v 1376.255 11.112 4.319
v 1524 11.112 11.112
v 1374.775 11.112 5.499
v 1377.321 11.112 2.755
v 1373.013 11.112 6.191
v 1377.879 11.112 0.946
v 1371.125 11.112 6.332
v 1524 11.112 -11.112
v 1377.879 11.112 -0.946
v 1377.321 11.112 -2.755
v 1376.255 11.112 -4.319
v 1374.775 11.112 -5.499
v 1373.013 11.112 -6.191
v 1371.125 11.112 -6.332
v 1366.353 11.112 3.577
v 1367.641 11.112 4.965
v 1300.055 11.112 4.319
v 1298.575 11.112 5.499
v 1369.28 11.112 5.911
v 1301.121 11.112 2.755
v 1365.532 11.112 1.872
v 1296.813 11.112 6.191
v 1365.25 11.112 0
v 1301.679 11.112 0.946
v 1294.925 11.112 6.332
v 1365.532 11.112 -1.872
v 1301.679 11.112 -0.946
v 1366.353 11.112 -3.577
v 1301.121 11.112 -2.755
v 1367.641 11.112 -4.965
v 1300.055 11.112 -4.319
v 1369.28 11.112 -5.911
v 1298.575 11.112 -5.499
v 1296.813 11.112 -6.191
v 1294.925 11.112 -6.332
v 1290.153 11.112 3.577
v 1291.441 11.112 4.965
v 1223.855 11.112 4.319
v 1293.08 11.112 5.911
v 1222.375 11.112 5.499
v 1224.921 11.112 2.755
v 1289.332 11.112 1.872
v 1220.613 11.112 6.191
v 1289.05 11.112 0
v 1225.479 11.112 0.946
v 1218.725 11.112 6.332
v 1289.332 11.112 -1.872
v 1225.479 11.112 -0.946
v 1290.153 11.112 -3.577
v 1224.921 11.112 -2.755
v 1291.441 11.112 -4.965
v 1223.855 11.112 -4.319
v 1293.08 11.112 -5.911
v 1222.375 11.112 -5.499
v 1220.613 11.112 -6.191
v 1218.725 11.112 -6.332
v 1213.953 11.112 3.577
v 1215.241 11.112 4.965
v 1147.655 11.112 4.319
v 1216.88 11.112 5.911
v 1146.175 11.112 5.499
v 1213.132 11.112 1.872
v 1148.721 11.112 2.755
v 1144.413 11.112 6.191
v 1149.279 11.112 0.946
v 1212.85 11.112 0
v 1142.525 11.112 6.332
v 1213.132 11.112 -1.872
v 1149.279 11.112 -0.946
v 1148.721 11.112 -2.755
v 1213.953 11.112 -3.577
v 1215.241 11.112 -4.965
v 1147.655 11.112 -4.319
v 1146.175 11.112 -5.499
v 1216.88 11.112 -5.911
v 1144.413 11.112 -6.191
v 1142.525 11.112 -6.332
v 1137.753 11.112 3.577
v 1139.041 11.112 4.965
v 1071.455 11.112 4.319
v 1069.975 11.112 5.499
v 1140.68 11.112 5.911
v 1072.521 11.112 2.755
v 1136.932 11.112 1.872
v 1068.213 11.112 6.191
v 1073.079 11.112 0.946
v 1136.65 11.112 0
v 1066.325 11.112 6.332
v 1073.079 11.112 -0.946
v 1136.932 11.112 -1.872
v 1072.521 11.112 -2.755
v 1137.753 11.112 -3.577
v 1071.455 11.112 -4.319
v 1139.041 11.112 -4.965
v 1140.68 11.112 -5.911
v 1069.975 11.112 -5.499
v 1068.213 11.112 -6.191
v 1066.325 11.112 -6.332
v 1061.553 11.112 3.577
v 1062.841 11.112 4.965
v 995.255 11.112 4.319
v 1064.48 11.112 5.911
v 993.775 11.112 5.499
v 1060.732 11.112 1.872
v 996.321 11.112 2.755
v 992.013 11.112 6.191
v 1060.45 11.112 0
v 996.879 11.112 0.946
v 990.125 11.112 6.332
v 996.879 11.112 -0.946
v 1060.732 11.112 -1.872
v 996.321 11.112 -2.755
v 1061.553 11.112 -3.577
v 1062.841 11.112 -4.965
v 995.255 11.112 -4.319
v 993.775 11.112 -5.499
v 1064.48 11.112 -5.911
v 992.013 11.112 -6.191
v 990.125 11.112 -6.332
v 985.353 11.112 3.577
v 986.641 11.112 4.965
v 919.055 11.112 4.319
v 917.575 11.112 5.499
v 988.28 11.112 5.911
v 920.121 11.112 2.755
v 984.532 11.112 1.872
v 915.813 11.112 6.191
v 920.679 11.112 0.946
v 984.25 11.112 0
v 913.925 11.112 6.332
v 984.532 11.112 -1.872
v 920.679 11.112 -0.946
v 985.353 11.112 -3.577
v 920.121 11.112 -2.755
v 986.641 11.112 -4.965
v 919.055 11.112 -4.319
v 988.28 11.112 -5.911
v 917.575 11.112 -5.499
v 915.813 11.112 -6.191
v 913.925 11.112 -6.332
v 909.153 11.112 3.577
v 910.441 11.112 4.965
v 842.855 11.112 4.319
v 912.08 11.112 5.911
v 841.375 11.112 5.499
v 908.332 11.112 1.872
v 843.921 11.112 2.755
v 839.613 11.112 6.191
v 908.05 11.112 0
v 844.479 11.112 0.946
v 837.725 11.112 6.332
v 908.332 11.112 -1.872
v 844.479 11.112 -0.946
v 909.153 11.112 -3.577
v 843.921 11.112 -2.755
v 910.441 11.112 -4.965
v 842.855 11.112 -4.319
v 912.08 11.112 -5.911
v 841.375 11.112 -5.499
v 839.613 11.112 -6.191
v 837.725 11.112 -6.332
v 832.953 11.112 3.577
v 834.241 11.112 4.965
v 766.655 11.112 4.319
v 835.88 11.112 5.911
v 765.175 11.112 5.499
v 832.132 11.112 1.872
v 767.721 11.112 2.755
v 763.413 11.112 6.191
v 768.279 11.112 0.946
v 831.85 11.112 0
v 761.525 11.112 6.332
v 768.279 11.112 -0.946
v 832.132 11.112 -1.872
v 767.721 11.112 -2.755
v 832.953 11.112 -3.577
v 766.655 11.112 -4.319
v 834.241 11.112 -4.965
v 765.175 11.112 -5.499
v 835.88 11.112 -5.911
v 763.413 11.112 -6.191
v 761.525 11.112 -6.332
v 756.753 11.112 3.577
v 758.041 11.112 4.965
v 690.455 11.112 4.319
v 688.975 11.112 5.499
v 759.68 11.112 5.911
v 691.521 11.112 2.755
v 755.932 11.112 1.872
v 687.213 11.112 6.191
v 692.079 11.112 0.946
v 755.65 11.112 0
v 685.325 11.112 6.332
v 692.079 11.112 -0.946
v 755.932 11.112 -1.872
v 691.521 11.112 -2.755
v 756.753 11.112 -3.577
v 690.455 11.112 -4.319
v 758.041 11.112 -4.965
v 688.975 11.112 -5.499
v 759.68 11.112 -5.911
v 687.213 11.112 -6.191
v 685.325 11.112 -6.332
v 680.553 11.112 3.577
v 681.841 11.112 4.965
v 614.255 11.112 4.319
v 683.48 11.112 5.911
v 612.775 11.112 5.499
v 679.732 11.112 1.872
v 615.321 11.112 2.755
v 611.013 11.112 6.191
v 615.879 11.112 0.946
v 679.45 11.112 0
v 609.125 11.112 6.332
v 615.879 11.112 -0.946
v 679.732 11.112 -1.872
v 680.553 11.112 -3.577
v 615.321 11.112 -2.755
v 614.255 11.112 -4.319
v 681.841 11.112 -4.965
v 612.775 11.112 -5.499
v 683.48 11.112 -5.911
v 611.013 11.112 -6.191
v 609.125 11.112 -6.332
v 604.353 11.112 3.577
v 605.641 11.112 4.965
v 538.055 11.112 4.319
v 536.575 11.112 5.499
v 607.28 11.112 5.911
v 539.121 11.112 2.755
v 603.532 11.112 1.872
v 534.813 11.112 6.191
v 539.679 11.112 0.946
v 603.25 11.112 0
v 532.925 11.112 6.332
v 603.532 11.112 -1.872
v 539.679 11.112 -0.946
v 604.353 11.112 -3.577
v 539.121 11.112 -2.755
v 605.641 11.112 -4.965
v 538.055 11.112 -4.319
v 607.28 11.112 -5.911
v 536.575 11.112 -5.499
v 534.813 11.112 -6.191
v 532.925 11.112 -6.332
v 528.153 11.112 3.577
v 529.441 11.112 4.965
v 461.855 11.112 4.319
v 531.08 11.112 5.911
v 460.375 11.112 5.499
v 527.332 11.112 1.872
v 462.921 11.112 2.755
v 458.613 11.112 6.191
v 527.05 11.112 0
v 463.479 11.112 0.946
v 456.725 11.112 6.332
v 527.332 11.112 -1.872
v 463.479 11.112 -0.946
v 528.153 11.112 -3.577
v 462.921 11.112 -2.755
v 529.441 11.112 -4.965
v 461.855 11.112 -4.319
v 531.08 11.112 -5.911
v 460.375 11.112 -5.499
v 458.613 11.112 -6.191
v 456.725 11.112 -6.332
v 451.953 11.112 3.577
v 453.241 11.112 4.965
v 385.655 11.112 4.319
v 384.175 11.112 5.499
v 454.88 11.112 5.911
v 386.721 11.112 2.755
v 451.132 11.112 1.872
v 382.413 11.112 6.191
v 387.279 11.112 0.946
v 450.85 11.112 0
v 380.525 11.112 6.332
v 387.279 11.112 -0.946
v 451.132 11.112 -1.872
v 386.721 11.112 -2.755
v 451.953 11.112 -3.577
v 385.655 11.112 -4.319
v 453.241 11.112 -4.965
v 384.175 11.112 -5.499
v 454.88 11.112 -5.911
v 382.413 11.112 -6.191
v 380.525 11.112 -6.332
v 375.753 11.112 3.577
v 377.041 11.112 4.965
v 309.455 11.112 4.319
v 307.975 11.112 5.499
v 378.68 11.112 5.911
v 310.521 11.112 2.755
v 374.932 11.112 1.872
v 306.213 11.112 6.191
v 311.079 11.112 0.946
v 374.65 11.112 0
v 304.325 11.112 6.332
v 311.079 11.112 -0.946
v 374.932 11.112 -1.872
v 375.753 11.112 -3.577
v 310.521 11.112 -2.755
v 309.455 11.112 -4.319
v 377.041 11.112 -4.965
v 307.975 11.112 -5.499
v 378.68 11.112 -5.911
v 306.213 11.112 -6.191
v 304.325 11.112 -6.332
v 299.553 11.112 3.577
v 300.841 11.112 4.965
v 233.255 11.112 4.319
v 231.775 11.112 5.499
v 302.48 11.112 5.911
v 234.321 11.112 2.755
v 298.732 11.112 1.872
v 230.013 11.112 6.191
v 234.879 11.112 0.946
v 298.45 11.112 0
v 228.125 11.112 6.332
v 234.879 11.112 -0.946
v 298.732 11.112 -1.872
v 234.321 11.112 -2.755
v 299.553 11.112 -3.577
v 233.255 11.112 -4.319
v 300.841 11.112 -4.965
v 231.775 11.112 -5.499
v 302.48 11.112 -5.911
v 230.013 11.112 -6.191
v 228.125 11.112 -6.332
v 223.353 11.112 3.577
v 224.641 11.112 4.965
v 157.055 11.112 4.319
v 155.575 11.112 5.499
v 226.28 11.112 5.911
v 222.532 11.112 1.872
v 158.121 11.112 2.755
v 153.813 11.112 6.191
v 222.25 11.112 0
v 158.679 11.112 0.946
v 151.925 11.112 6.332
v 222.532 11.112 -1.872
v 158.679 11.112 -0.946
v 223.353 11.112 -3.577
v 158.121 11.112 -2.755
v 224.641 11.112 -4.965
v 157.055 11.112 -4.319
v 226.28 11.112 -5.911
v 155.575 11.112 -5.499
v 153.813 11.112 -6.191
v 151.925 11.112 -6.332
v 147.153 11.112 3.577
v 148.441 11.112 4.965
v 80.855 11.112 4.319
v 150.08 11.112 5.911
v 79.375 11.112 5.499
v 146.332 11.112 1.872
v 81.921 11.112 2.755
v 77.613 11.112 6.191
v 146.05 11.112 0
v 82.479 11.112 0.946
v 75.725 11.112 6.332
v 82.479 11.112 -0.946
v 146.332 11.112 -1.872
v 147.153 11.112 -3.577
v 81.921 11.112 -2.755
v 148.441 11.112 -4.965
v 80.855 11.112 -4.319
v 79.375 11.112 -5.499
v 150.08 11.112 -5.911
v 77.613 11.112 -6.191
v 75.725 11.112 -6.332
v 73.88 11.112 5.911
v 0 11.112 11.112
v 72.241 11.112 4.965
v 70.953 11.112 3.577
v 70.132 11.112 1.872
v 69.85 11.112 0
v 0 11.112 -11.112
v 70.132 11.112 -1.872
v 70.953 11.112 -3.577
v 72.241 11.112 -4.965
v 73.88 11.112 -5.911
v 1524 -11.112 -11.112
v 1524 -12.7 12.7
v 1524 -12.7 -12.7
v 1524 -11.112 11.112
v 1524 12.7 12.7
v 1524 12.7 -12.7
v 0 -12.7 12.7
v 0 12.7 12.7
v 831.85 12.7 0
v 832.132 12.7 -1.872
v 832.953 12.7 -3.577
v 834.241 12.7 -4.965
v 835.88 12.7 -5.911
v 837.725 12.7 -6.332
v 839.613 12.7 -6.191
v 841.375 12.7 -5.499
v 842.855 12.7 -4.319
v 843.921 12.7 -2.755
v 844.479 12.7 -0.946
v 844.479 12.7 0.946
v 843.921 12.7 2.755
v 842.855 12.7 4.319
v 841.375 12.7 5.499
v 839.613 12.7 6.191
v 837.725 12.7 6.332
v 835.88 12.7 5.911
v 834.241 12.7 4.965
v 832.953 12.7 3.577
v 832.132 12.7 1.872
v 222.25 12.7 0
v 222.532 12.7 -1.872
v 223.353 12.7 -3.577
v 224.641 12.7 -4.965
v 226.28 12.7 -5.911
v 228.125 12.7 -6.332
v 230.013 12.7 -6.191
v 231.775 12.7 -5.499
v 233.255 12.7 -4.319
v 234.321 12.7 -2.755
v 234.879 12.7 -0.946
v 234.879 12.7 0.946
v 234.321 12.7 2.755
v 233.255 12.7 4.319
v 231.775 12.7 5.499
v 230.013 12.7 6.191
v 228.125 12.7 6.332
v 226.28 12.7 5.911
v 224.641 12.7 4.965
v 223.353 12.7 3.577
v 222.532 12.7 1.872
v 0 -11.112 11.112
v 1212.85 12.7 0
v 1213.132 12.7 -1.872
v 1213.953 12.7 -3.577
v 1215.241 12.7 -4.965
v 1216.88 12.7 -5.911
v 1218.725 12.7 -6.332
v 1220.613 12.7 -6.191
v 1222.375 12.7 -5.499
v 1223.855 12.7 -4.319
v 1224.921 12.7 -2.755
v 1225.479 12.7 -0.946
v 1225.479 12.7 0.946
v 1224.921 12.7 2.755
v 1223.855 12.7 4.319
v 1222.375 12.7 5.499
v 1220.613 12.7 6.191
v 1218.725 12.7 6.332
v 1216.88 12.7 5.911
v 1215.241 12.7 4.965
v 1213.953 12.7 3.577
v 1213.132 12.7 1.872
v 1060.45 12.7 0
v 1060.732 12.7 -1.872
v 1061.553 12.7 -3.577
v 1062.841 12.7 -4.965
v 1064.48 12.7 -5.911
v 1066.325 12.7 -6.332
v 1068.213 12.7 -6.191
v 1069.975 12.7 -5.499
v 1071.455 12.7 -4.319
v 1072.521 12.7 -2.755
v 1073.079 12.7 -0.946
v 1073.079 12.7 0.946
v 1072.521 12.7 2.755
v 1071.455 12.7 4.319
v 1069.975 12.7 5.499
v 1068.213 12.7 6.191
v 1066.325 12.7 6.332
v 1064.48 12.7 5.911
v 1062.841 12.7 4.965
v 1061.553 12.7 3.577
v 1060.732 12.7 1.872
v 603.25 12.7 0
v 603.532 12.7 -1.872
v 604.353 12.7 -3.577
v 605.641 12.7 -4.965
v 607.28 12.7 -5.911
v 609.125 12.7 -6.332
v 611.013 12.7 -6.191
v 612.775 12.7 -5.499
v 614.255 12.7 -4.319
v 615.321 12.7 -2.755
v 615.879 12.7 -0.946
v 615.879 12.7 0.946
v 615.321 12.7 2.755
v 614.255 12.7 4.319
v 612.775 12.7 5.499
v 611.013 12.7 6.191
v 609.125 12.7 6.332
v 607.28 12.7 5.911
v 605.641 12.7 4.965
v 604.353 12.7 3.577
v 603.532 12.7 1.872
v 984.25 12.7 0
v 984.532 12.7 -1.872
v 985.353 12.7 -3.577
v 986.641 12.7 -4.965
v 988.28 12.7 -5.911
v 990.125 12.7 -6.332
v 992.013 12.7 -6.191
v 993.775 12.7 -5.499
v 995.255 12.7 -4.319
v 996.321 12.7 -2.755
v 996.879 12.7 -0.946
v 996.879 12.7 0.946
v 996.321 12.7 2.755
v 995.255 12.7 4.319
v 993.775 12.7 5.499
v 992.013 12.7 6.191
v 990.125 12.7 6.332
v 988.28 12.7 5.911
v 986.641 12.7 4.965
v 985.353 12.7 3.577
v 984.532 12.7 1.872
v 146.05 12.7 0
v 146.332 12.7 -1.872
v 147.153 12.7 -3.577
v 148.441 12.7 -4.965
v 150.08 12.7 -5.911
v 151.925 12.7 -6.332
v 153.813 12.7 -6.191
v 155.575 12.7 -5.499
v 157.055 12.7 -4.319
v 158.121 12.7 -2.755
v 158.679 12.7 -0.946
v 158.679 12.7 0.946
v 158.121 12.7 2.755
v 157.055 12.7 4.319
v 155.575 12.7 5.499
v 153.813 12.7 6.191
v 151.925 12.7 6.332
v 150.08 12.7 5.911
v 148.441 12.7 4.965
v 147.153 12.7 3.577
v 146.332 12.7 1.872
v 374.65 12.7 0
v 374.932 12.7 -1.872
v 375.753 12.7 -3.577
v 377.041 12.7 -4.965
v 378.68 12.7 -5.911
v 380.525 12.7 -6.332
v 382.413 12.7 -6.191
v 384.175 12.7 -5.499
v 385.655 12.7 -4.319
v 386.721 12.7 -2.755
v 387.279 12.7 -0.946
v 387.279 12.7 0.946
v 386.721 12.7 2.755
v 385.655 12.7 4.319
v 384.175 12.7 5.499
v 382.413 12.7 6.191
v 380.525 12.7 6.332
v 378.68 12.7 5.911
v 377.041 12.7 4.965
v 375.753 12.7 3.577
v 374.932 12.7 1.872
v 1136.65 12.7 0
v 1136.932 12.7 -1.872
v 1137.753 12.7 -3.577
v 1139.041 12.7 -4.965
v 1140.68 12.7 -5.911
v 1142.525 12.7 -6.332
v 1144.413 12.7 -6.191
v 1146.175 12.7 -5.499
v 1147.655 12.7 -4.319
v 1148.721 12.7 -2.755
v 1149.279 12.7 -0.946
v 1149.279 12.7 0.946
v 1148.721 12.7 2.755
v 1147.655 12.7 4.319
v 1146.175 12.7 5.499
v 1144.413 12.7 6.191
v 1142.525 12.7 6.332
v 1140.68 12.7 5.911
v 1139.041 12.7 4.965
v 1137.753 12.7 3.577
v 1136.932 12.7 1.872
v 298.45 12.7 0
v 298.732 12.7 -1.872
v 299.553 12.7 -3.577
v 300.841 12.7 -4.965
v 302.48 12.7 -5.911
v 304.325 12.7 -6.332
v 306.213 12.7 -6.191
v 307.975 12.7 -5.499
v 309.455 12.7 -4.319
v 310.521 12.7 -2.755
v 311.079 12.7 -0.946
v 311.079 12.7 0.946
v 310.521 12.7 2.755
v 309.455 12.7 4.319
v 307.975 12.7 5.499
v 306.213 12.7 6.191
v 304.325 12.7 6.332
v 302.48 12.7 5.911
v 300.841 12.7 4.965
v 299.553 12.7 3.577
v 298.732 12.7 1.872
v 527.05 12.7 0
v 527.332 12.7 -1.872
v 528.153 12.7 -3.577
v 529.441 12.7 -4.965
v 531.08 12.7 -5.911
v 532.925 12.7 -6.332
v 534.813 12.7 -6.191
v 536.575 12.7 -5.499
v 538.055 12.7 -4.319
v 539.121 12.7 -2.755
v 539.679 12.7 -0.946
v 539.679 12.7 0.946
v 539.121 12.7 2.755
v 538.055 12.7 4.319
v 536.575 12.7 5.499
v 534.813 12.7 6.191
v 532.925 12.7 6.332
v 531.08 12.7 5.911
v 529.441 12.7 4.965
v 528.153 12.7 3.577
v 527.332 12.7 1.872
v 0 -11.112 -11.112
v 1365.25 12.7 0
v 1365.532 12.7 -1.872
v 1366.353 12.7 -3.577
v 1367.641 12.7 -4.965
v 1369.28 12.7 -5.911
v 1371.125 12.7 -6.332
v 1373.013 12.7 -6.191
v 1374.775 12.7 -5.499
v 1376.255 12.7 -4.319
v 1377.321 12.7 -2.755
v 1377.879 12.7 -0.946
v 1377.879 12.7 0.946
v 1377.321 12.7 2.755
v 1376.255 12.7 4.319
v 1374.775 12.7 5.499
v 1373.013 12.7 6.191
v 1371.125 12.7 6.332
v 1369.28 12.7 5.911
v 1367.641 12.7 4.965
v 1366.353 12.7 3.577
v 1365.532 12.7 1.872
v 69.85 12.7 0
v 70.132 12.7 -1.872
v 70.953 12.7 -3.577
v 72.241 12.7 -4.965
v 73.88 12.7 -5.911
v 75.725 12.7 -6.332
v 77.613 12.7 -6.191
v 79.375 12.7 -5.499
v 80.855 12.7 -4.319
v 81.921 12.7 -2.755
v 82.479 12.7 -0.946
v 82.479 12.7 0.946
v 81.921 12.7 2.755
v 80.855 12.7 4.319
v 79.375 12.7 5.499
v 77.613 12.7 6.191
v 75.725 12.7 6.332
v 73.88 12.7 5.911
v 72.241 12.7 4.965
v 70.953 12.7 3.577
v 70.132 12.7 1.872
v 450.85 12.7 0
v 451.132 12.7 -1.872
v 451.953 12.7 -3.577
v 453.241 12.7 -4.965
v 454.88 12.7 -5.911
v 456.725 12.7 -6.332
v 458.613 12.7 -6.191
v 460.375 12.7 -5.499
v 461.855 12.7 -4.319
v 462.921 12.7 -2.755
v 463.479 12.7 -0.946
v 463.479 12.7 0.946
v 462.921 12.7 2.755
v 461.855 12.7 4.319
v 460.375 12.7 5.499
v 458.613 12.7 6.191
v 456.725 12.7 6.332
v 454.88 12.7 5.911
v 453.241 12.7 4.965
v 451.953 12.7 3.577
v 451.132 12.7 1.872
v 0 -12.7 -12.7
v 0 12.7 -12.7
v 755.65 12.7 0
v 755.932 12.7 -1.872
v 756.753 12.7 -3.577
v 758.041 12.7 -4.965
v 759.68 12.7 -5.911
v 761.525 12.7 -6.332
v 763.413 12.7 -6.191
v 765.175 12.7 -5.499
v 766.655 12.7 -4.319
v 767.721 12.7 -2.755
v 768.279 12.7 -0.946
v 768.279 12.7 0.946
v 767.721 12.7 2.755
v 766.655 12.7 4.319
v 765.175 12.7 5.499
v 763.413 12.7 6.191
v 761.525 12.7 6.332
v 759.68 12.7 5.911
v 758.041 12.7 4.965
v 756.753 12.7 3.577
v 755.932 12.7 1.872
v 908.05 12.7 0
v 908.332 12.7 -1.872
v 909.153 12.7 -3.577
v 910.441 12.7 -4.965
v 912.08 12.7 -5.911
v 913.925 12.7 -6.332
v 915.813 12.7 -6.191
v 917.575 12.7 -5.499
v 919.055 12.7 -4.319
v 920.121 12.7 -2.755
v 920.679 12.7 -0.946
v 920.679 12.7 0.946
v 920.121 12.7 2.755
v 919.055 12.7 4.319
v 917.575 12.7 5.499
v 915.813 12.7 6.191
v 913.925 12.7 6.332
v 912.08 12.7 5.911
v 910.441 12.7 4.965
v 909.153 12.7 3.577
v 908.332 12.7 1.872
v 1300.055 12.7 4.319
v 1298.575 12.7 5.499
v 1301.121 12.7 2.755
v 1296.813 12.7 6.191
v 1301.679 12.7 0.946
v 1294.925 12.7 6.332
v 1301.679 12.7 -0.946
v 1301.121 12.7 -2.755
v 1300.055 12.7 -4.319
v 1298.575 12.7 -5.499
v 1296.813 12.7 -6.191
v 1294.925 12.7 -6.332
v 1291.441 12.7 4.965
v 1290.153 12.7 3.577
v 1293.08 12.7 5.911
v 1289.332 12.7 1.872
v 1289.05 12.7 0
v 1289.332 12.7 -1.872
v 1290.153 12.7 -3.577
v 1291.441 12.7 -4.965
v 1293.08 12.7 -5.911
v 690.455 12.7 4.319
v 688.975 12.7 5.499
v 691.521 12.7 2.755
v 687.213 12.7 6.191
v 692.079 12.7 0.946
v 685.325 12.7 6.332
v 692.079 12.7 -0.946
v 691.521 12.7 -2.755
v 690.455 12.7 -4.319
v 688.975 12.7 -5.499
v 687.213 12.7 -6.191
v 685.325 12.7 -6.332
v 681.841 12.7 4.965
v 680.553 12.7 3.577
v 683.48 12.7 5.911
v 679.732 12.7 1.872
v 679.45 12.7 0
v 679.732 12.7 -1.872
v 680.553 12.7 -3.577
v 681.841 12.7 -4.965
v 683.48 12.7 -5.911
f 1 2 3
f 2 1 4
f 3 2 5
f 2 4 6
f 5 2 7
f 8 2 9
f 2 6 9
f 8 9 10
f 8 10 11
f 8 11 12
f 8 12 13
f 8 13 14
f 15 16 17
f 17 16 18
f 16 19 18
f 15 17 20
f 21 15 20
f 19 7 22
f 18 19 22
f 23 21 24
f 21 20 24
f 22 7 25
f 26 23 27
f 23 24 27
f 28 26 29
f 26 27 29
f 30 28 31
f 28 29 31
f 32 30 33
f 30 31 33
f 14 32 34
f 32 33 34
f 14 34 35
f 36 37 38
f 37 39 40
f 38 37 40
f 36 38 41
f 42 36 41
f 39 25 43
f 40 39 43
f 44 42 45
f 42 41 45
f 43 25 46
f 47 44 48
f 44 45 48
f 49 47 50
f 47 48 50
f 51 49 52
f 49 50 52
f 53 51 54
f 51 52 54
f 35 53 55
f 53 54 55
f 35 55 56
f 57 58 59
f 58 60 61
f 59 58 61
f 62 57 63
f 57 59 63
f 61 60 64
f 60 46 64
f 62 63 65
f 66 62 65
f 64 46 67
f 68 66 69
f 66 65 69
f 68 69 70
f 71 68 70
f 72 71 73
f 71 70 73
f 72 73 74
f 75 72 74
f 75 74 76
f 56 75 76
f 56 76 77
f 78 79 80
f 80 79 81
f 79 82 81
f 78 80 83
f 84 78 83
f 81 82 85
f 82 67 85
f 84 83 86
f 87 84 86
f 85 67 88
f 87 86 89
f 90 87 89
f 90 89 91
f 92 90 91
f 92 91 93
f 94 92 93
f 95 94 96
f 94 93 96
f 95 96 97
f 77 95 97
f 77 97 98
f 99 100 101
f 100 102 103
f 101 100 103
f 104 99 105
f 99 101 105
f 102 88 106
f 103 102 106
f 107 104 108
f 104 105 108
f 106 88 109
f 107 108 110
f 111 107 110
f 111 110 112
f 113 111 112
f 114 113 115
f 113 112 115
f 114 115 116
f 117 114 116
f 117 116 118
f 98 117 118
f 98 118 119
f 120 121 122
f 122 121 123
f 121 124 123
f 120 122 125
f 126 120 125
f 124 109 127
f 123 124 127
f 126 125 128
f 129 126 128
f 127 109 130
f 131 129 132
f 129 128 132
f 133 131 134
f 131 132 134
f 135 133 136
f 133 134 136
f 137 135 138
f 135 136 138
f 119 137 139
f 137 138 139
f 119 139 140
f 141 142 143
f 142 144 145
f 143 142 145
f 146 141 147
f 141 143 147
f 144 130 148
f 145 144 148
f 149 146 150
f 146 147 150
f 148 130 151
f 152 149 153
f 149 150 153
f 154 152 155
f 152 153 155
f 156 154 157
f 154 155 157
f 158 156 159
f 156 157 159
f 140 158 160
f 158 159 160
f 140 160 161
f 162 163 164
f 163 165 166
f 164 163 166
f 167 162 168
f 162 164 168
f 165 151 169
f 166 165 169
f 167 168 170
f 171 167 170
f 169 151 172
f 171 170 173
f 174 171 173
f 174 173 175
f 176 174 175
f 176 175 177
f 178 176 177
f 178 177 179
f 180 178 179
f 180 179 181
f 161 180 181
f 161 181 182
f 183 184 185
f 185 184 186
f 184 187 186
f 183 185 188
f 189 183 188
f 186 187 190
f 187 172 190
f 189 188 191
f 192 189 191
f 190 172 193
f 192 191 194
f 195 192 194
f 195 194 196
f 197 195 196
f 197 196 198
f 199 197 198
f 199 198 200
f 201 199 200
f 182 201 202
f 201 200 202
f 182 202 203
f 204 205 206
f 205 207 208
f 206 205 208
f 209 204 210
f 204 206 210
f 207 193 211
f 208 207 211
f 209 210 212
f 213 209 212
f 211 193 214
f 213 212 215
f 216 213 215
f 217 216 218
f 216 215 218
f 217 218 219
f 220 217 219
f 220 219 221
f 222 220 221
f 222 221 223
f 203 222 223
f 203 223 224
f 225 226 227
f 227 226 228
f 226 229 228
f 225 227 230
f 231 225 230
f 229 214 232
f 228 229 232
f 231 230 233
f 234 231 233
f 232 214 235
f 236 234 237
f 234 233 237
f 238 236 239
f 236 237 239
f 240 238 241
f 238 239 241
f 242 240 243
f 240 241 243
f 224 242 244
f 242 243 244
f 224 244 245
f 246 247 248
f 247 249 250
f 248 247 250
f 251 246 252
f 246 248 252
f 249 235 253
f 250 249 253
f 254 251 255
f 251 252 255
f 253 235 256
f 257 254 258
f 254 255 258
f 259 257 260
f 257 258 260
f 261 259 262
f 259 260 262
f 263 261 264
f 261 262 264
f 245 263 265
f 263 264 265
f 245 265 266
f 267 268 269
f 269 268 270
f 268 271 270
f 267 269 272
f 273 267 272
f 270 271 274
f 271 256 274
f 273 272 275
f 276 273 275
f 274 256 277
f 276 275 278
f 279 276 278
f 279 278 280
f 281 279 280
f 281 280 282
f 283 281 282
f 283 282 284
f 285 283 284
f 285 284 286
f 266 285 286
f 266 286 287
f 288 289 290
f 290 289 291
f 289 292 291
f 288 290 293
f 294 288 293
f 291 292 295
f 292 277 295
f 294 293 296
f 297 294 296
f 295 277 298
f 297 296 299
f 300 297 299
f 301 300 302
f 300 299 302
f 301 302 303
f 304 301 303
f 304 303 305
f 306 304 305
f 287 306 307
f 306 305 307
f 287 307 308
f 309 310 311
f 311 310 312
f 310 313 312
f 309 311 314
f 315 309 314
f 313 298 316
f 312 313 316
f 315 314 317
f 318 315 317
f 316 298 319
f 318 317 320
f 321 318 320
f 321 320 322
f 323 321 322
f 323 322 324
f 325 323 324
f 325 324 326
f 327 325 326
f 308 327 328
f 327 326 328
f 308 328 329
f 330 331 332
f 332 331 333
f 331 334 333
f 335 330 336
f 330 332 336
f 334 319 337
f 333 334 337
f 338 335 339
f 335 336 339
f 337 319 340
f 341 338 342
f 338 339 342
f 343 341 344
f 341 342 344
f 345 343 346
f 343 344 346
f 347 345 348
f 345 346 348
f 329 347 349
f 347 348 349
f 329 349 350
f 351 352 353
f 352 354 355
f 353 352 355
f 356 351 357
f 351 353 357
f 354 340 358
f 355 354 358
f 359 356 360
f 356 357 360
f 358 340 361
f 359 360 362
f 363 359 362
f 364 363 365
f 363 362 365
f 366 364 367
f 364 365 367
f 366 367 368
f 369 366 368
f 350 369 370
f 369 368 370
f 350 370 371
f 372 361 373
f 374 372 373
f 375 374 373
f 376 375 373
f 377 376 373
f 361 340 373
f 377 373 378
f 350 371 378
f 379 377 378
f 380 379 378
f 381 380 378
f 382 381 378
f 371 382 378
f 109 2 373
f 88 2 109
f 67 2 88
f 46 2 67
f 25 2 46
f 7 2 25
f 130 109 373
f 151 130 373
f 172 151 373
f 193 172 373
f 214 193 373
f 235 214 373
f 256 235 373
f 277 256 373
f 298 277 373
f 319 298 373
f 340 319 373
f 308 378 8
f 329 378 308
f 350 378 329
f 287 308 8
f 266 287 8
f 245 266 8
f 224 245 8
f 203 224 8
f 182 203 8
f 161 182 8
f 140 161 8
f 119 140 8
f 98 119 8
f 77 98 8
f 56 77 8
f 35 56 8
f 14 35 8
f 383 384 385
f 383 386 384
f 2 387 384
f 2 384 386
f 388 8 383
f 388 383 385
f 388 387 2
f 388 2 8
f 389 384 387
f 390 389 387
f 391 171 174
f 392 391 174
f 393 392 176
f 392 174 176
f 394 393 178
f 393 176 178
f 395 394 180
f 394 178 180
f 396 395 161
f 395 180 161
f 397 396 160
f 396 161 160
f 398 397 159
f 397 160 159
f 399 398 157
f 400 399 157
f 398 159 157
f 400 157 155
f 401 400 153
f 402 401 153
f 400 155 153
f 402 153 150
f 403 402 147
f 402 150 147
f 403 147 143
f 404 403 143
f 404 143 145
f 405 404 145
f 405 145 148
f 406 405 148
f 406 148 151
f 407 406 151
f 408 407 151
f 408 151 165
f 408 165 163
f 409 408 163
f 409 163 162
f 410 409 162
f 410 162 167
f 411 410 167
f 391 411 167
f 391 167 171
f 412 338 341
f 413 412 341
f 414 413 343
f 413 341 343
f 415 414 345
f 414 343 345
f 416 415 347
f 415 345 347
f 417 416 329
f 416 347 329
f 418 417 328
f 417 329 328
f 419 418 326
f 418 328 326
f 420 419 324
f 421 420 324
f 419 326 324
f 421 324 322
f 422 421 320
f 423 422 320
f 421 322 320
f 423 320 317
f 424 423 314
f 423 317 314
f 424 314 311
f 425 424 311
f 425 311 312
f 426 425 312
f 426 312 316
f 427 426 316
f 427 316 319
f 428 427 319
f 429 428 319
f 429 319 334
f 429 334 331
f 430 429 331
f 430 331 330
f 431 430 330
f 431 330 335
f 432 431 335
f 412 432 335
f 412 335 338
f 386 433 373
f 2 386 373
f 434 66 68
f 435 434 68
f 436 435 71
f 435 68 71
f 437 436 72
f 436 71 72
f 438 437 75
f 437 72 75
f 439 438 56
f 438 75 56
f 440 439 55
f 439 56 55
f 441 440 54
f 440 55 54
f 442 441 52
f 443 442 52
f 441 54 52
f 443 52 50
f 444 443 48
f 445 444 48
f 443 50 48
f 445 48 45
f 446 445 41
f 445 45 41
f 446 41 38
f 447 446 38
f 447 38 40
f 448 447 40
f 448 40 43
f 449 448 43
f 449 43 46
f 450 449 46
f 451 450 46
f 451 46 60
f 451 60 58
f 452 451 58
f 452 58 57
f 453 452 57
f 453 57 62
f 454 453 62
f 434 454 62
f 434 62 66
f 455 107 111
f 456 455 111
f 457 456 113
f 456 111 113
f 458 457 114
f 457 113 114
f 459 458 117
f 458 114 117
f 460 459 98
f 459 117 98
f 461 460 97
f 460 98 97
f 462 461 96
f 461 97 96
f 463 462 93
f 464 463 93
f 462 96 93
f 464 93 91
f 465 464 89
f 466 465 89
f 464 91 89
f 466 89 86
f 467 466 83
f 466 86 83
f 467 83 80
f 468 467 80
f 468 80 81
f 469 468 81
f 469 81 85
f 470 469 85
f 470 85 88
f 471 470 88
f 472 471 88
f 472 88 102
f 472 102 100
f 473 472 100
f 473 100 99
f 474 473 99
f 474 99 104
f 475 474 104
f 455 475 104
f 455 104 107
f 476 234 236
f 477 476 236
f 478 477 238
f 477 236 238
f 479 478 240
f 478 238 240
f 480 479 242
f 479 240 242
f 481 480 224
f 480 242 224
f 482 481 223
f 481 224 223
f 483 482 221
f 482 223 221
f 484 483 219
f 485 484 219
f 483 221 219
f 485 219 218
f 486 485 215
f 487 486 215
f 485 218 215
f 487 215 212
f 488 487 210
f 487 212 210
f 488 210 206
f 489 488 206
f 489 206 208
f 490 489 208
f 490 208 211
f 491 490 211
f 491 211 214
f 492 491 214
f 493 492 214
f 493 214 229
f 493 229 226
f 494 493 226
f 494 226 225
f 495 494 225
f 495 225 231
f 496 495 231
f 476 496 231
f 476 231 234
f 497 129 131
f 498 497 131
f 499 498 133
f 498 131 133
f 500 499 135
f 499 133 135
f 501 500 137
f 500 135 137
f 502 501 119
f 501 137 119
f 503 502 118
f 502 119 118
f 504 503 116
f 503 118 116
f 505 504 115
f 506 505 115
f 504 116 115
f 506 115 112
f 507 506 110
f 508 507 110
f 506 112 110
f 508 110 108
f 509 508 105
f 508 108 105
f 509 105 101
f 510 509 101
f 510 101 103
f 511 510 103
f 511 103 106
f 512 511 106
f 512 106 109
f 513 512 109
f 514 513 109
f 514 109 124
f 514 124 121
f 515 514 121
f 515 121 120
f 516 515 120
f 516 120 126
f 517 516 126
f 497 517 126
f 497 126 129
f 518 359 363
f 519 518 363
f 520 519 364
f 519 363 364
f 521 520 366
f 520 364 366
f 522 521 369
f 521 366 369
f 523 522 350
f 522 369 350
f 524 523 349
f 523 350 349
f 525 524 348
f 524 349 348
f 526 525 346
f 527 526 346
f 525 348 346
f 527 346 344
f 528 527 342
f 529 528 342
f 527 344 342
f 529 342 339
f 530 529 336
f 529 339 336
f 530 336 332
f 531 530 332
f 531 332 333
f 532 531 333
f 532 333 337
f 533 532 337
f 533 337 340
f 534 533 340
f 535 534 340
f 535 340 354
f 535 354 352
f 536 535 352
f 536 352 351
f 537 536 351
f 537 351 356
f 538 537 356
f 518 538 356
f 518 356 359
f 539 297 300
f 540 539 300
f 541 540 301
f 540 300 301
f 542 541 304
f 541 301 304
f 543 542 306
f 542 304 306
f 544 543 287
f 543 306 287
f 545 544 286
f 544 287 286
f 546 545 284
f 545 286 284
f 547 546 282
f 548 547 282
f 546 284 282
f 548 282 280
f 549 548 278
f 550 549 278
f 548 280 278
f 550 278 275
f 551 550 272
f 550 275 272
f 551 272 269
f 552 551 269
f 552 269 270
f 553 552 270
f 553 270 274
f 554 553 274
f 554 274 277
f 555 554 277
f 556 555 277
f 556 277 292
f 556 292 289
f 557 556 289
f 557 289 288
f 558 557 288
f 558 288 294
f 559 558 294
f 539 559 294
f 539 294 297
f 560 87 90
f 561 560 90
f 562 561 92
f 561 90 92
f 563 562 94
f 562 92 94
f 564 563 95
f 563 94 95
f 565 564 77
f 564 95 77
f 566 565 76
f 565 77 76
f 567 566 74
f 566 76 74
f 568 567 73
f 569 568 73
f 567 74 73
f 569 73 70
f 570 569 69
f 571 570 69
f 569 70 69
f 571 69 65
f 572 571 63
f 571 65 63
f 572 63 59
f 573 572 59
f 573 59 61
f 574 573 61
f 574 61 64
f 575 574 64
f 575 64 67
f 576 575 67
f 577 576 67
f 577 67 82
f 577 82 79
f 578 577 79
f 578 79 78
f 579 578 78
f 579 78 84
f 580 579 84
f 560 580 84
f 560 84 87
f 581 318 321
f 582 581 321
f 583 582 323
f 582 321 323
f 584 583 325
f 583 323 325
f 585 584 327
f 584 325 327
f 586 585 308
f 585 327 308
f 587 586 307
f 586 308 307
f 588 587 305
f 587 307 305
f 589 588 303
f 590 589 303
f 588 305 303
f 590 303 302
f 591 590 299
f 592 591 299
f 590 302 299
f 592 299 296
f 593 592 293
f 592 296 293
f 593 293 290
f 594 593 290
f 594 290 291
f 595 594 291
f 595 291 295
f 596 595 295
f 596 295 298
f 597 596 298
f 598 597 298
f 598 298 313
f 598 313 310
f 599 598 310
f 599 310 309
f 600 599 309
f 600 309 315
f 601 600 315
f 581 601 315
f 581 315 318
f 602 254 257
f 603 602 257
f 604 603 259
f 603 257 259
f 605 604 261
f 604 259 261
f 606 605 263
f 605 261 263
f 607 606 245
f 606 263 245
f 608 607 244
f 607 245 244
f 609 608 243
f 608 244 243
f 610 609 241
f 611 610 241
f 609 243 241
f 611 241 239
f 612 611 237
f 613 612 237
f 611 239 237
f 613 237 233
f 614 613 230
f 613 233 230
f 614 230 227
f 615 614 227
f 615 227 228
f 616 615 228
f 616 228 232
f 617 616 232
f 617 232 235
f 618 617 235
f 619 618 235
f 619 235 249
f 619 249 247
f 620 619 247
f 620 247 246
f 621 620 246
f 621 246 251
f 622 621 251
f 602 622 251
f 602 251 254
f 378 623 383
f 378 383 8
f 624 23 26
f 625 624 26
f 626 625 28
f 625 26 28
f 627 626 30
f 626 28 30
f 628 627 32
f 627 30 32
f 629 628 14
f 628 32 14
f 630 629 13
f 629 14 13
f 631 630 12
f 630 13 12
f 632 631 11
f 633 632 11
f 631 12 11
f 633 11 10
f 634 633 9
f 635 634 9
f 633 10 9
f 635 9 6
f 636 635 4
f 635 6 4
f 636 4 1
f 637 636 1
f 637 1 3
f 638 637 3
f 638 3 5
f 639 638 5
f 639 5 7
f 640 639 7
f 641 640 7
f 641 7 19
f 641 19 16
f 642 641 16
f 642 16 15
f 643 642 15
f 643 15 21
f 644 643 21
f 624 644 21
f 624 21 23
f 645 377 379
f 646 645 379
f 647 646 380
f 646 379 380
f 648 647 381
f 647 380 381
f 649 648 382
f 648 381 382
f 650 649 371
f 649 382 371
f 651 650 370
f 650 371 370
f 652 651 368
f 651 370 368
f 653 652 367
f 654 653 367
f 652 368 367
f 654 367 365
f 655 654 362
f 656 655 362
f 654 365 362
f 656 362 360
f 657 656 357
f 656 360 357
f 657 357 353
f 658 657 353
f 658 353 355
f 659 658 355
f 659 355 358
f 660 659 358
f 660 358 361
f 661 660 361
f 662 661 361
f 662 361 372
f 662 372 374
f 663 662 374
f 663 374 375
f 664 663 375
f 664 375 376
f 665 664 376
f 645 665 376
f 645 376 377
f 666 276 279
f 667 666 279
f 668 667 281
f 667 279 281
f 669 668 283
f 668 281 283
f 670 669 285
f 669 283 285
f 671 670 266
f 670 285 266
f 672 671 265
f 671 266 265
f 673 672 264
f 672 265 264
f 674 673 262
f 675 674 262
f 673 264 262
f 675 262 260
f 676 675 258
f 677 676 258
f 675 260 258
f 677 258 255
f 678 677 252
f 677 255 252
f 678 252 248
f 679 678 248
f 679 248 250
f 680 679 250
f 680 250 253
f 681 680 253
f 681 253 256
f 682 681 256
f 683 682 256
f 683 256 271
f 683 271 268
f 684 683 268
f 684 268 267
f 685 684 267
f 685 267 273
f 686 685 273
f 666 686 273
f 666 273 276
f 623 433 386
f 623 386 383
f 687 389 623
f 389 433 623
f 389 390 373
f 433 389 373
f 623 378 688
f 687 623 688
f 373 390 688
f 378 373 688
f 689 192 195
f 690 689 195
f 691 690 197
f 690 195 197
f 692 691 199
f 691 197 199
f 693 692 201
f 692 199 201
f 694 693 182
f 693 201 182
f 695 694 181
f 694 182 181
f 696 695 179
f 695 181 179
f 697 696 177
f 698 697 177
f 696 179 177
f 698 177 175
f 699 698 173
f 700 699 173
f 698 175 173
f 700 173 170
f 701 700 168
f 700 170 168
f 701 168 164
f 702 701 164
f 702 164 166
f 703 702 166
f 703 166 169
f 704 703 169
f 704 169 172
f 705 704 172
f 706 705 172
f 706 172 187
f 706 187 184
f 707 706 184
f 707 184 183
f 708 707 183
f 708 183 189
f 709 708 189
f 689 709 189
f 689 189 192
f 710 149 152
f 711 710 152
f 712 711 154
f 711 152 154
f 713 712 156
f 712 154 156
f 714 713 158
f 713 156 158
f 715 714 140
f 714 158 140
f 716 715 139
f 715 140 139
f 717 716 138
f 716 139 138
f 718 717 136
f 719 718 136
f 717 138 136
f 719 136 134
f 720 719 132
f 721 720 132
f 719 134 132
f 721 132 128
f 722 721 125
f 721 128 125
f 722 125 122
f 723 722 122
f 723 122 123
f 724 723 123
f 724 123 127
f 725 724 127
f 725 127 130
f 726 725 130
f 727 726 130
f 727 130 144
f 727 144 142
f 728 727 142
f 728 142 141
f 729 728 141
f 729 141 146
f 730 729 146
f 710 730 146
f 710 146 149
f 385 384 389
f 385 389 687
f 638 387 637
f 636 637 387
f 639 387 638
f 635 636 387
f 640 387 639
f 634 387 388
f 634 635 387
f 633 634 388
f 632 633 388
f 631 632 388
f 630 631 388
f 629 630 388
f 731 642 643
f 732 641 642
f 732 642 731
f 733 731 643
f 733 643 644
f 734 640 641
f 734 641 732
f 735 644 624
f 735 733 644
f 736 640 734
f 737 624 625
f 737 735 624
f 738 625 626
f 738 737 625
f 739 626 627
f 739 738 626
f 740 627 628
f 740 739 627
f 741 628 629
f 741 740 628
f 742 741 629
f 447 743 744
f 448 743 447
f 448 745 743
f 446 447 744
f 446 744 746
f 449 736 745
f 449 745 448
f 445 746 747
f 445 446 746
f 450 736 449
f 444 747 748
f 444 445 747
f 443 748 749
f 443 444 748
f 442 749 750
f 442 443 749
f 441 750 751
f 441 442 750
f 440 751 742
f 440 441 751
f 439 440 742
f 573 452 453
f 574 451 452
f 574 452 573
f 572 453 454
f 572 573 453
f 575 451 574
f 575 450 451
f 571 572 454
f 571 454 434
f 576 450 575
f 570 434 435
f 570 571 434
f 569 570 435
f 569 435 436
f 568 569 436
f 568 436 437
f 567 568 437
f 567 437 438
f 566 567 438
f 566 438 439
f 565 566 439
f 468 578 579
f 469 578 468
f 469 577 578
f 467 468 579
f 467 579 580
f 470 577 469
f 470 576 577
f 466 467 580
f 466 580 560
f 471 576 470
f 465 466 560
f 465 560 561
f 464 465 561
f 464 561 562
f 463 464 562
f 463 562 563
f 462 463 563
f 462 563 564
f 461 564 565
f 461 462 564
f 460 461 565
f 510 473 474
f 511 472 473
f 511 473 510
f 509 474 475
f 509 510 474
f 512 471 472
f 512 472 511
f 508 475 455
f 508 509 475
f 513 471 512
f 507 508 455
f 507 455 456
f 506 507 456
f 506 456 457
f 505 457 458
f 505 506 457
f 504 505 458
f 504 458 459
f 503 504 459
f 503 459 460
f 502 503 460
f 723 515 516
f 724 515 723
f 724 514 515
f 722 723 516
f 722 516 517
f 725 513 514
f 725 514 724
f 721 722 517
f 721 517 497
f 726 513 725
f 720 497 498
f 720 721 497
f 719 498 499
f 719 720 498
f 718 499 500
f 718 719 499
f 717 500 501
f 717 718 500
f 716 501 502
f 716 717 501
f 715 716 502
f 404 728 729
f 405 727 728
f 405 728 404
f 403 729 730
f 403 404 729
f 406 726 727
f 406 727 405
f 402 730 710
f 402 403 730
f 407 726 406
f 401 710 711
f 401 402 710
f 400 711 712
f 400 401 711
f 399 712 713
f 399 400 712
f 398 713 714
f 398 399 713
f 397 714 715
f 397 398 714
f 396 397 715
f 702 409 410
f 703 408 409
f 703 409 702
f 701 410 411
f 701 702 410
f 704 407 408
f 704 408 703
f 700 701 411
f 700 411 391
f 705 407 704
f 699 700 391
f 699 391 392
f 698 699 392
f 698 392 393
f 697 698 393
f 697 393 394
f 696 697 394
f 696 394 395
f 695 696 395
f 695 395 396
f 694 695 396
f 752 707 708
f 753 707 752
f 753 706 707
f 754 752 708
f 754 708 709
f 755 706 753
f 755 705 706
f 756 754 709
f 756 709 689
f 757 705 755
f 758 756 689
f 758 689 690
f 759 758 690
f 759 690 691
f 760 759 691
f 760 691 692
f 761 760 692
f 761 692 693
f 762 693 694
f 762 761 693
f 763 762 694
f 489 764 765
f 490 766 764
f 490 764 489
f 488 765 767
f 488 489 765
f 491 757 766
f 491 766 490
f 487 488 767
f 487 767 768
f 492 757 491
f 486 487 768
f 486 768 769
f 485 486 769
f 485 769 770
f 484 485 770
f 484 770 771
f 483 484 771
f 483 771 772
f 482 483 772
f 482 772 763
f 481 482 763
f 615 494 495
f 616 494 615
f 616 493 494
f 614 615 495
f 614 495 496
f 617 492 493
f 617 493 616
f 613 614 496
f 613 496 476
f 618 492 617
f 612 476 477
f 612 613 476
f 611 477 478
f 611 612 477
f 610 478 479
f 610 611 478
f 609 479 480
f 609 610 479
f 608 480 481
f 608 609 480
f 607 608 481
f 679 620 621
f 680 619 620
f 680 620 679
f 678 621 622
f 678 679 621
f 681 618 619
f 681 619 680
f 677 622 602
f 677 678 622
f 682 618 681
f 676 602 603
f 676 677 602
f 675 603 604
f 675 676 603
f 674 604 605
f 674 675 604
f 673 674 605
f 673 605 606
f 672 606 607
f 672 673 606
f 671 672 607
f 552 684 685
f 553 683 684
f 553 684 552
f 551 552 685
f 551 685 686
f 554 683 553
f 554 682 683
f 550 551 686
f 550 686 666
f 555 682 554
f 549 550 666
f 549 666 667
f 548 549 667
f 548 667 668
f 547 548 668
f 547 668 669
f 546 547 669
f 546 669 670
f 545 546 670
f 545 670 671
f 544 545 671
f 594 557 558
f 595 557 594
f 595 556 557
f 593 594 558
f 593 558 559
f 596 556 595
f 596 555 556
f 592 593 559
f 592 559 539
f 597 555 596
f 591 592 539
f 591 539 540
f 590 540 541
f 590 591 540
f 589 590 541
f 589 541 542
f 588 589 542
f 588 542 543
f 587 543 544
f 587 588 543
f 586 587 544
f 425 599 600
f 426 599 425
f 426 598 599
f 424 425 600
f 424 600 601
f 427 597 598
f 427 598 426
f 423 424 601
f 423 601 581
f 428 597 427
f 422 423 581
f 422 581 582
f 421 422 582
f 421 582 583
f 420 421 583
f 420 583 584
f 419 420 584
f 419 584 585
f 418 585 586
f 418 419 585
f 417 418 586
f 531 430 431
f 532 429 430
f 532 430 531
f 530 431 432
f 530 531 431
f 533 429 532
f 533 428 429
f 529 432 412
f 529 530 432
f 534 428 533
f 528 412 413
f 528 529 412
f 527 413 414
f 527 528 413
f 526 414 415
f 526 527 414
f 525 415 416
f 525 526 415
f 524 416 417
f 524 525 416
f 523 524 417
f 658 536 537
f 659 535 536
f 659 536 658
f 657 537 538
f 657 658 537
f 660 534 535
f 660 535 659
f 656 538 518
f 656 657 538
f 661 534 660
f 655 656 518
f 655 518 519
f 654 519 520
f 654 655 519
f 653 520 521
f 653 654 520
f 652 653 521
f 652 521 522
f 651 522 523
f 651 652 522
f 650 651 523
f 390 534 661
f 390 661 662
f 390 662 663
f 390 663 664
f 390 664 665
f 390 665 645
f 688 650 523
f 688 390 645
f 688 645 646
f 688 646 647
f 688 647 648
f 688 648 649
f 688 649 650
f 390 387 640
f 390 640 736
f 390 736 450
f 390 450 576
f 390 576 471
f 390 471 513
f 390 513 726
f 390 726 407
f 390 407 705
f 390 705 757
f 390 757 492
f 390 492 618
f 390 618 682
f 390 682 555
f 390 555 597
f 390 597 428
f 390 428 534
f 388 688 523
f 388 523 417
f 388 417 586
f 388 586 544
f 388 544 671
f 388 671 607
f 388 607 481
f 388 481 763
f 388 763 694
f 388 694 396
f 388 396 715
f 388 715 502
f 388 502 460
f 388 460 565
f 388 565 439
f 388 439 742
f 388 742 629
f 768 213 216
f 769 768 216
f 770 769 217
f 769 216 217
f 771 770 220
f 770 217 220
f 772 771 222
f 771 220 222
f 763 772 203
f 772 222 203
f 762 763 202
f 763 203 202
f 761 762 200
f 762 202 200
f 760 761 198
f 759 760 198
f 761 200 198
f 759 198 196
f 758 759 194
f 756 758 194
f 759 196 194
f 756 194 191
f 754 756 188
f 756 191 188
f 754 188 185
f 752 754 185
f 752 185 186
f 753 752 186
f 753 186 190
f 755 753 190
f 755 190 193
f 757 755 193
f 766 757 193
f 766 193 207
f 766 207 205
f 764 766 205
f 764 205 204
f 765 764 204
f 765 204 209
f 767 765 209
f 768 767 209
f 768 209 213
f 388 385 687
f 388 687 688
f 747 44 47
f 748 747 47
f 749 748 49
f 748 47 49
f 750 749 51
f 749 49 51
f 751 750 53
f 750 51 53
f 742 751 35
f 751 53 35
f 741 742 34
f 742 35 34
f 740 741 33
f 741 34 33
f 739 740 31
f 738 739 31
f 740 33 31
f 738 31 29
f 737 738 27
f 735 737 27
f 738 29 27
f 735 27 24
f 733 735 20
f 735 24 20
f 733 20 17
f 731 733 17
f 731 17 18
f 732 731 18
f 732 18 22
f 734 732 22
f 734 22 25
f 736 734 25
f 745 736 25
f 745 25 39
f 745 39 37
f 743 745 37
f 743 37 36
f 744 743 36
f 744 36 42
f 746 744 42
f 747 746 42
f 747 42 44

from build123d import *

# Parameters (mm, degrees)
SKETCH1_W                      = 25.4
SKETCH1_H                      = 25.4
SKETCH1_W_2                    = 22.225
SKETCH1_H_2                    = 22.225
BOSS_EXTRUDE1_DEPTH            = 1524
F_1_2_0_5_DIAMETER_HOLE1_D     = 12.7
F_1_2_0_5_DIAMETER_HOLE1_DEPTH = 1.5875
LPATTERN1_COUNT                = 18
LPATTERN1_PITCH                = 76.2


with BuildPart() as part:
    # Sketch1 → Boss-Extrude1 (new body)
    with BuildSketch(Plane(origin=(0, 0, 0), x_dir=(0, 0, -1), z_dir=(1, 0, 0))):
        Rectangle(SKETCH1_W, SKETCH1_H)
        Rectangle(SKETCH1_W_2, SKETCH1_H_2, mode=Mode.SUBTRACT)
    extrude(amount=BOSS_EXTRUDE1_DEPTH)

    # 1/2 (0.5) Diameter Hole1
    with Locations(Plane(origin=(0, 12.7, 0), x_dir=(1, 0, 0), z_dir=(0, 1, 0))):
        with Locations((1371.6, 0)):
            f_1_2_0_5_diameter_hole1 = Hole(F_1_2_0_5_DIAMETER_HOLE1_D / 2, depth=F_1_2_0_5_DIAMETER_HOLE1_DEPTH)

    # LPattern1: 1/2 (0.5) Diameter Hole1 ×18
    with Locations(*[(-i * LPATTERN1_PITCH, 0, 0) for i in range(1, LPATTERN1_COUNT)]):
        add(f_1_2_0_5_diameter_hole1, mode=Mode.SUBTRACT)


solid = part.part
